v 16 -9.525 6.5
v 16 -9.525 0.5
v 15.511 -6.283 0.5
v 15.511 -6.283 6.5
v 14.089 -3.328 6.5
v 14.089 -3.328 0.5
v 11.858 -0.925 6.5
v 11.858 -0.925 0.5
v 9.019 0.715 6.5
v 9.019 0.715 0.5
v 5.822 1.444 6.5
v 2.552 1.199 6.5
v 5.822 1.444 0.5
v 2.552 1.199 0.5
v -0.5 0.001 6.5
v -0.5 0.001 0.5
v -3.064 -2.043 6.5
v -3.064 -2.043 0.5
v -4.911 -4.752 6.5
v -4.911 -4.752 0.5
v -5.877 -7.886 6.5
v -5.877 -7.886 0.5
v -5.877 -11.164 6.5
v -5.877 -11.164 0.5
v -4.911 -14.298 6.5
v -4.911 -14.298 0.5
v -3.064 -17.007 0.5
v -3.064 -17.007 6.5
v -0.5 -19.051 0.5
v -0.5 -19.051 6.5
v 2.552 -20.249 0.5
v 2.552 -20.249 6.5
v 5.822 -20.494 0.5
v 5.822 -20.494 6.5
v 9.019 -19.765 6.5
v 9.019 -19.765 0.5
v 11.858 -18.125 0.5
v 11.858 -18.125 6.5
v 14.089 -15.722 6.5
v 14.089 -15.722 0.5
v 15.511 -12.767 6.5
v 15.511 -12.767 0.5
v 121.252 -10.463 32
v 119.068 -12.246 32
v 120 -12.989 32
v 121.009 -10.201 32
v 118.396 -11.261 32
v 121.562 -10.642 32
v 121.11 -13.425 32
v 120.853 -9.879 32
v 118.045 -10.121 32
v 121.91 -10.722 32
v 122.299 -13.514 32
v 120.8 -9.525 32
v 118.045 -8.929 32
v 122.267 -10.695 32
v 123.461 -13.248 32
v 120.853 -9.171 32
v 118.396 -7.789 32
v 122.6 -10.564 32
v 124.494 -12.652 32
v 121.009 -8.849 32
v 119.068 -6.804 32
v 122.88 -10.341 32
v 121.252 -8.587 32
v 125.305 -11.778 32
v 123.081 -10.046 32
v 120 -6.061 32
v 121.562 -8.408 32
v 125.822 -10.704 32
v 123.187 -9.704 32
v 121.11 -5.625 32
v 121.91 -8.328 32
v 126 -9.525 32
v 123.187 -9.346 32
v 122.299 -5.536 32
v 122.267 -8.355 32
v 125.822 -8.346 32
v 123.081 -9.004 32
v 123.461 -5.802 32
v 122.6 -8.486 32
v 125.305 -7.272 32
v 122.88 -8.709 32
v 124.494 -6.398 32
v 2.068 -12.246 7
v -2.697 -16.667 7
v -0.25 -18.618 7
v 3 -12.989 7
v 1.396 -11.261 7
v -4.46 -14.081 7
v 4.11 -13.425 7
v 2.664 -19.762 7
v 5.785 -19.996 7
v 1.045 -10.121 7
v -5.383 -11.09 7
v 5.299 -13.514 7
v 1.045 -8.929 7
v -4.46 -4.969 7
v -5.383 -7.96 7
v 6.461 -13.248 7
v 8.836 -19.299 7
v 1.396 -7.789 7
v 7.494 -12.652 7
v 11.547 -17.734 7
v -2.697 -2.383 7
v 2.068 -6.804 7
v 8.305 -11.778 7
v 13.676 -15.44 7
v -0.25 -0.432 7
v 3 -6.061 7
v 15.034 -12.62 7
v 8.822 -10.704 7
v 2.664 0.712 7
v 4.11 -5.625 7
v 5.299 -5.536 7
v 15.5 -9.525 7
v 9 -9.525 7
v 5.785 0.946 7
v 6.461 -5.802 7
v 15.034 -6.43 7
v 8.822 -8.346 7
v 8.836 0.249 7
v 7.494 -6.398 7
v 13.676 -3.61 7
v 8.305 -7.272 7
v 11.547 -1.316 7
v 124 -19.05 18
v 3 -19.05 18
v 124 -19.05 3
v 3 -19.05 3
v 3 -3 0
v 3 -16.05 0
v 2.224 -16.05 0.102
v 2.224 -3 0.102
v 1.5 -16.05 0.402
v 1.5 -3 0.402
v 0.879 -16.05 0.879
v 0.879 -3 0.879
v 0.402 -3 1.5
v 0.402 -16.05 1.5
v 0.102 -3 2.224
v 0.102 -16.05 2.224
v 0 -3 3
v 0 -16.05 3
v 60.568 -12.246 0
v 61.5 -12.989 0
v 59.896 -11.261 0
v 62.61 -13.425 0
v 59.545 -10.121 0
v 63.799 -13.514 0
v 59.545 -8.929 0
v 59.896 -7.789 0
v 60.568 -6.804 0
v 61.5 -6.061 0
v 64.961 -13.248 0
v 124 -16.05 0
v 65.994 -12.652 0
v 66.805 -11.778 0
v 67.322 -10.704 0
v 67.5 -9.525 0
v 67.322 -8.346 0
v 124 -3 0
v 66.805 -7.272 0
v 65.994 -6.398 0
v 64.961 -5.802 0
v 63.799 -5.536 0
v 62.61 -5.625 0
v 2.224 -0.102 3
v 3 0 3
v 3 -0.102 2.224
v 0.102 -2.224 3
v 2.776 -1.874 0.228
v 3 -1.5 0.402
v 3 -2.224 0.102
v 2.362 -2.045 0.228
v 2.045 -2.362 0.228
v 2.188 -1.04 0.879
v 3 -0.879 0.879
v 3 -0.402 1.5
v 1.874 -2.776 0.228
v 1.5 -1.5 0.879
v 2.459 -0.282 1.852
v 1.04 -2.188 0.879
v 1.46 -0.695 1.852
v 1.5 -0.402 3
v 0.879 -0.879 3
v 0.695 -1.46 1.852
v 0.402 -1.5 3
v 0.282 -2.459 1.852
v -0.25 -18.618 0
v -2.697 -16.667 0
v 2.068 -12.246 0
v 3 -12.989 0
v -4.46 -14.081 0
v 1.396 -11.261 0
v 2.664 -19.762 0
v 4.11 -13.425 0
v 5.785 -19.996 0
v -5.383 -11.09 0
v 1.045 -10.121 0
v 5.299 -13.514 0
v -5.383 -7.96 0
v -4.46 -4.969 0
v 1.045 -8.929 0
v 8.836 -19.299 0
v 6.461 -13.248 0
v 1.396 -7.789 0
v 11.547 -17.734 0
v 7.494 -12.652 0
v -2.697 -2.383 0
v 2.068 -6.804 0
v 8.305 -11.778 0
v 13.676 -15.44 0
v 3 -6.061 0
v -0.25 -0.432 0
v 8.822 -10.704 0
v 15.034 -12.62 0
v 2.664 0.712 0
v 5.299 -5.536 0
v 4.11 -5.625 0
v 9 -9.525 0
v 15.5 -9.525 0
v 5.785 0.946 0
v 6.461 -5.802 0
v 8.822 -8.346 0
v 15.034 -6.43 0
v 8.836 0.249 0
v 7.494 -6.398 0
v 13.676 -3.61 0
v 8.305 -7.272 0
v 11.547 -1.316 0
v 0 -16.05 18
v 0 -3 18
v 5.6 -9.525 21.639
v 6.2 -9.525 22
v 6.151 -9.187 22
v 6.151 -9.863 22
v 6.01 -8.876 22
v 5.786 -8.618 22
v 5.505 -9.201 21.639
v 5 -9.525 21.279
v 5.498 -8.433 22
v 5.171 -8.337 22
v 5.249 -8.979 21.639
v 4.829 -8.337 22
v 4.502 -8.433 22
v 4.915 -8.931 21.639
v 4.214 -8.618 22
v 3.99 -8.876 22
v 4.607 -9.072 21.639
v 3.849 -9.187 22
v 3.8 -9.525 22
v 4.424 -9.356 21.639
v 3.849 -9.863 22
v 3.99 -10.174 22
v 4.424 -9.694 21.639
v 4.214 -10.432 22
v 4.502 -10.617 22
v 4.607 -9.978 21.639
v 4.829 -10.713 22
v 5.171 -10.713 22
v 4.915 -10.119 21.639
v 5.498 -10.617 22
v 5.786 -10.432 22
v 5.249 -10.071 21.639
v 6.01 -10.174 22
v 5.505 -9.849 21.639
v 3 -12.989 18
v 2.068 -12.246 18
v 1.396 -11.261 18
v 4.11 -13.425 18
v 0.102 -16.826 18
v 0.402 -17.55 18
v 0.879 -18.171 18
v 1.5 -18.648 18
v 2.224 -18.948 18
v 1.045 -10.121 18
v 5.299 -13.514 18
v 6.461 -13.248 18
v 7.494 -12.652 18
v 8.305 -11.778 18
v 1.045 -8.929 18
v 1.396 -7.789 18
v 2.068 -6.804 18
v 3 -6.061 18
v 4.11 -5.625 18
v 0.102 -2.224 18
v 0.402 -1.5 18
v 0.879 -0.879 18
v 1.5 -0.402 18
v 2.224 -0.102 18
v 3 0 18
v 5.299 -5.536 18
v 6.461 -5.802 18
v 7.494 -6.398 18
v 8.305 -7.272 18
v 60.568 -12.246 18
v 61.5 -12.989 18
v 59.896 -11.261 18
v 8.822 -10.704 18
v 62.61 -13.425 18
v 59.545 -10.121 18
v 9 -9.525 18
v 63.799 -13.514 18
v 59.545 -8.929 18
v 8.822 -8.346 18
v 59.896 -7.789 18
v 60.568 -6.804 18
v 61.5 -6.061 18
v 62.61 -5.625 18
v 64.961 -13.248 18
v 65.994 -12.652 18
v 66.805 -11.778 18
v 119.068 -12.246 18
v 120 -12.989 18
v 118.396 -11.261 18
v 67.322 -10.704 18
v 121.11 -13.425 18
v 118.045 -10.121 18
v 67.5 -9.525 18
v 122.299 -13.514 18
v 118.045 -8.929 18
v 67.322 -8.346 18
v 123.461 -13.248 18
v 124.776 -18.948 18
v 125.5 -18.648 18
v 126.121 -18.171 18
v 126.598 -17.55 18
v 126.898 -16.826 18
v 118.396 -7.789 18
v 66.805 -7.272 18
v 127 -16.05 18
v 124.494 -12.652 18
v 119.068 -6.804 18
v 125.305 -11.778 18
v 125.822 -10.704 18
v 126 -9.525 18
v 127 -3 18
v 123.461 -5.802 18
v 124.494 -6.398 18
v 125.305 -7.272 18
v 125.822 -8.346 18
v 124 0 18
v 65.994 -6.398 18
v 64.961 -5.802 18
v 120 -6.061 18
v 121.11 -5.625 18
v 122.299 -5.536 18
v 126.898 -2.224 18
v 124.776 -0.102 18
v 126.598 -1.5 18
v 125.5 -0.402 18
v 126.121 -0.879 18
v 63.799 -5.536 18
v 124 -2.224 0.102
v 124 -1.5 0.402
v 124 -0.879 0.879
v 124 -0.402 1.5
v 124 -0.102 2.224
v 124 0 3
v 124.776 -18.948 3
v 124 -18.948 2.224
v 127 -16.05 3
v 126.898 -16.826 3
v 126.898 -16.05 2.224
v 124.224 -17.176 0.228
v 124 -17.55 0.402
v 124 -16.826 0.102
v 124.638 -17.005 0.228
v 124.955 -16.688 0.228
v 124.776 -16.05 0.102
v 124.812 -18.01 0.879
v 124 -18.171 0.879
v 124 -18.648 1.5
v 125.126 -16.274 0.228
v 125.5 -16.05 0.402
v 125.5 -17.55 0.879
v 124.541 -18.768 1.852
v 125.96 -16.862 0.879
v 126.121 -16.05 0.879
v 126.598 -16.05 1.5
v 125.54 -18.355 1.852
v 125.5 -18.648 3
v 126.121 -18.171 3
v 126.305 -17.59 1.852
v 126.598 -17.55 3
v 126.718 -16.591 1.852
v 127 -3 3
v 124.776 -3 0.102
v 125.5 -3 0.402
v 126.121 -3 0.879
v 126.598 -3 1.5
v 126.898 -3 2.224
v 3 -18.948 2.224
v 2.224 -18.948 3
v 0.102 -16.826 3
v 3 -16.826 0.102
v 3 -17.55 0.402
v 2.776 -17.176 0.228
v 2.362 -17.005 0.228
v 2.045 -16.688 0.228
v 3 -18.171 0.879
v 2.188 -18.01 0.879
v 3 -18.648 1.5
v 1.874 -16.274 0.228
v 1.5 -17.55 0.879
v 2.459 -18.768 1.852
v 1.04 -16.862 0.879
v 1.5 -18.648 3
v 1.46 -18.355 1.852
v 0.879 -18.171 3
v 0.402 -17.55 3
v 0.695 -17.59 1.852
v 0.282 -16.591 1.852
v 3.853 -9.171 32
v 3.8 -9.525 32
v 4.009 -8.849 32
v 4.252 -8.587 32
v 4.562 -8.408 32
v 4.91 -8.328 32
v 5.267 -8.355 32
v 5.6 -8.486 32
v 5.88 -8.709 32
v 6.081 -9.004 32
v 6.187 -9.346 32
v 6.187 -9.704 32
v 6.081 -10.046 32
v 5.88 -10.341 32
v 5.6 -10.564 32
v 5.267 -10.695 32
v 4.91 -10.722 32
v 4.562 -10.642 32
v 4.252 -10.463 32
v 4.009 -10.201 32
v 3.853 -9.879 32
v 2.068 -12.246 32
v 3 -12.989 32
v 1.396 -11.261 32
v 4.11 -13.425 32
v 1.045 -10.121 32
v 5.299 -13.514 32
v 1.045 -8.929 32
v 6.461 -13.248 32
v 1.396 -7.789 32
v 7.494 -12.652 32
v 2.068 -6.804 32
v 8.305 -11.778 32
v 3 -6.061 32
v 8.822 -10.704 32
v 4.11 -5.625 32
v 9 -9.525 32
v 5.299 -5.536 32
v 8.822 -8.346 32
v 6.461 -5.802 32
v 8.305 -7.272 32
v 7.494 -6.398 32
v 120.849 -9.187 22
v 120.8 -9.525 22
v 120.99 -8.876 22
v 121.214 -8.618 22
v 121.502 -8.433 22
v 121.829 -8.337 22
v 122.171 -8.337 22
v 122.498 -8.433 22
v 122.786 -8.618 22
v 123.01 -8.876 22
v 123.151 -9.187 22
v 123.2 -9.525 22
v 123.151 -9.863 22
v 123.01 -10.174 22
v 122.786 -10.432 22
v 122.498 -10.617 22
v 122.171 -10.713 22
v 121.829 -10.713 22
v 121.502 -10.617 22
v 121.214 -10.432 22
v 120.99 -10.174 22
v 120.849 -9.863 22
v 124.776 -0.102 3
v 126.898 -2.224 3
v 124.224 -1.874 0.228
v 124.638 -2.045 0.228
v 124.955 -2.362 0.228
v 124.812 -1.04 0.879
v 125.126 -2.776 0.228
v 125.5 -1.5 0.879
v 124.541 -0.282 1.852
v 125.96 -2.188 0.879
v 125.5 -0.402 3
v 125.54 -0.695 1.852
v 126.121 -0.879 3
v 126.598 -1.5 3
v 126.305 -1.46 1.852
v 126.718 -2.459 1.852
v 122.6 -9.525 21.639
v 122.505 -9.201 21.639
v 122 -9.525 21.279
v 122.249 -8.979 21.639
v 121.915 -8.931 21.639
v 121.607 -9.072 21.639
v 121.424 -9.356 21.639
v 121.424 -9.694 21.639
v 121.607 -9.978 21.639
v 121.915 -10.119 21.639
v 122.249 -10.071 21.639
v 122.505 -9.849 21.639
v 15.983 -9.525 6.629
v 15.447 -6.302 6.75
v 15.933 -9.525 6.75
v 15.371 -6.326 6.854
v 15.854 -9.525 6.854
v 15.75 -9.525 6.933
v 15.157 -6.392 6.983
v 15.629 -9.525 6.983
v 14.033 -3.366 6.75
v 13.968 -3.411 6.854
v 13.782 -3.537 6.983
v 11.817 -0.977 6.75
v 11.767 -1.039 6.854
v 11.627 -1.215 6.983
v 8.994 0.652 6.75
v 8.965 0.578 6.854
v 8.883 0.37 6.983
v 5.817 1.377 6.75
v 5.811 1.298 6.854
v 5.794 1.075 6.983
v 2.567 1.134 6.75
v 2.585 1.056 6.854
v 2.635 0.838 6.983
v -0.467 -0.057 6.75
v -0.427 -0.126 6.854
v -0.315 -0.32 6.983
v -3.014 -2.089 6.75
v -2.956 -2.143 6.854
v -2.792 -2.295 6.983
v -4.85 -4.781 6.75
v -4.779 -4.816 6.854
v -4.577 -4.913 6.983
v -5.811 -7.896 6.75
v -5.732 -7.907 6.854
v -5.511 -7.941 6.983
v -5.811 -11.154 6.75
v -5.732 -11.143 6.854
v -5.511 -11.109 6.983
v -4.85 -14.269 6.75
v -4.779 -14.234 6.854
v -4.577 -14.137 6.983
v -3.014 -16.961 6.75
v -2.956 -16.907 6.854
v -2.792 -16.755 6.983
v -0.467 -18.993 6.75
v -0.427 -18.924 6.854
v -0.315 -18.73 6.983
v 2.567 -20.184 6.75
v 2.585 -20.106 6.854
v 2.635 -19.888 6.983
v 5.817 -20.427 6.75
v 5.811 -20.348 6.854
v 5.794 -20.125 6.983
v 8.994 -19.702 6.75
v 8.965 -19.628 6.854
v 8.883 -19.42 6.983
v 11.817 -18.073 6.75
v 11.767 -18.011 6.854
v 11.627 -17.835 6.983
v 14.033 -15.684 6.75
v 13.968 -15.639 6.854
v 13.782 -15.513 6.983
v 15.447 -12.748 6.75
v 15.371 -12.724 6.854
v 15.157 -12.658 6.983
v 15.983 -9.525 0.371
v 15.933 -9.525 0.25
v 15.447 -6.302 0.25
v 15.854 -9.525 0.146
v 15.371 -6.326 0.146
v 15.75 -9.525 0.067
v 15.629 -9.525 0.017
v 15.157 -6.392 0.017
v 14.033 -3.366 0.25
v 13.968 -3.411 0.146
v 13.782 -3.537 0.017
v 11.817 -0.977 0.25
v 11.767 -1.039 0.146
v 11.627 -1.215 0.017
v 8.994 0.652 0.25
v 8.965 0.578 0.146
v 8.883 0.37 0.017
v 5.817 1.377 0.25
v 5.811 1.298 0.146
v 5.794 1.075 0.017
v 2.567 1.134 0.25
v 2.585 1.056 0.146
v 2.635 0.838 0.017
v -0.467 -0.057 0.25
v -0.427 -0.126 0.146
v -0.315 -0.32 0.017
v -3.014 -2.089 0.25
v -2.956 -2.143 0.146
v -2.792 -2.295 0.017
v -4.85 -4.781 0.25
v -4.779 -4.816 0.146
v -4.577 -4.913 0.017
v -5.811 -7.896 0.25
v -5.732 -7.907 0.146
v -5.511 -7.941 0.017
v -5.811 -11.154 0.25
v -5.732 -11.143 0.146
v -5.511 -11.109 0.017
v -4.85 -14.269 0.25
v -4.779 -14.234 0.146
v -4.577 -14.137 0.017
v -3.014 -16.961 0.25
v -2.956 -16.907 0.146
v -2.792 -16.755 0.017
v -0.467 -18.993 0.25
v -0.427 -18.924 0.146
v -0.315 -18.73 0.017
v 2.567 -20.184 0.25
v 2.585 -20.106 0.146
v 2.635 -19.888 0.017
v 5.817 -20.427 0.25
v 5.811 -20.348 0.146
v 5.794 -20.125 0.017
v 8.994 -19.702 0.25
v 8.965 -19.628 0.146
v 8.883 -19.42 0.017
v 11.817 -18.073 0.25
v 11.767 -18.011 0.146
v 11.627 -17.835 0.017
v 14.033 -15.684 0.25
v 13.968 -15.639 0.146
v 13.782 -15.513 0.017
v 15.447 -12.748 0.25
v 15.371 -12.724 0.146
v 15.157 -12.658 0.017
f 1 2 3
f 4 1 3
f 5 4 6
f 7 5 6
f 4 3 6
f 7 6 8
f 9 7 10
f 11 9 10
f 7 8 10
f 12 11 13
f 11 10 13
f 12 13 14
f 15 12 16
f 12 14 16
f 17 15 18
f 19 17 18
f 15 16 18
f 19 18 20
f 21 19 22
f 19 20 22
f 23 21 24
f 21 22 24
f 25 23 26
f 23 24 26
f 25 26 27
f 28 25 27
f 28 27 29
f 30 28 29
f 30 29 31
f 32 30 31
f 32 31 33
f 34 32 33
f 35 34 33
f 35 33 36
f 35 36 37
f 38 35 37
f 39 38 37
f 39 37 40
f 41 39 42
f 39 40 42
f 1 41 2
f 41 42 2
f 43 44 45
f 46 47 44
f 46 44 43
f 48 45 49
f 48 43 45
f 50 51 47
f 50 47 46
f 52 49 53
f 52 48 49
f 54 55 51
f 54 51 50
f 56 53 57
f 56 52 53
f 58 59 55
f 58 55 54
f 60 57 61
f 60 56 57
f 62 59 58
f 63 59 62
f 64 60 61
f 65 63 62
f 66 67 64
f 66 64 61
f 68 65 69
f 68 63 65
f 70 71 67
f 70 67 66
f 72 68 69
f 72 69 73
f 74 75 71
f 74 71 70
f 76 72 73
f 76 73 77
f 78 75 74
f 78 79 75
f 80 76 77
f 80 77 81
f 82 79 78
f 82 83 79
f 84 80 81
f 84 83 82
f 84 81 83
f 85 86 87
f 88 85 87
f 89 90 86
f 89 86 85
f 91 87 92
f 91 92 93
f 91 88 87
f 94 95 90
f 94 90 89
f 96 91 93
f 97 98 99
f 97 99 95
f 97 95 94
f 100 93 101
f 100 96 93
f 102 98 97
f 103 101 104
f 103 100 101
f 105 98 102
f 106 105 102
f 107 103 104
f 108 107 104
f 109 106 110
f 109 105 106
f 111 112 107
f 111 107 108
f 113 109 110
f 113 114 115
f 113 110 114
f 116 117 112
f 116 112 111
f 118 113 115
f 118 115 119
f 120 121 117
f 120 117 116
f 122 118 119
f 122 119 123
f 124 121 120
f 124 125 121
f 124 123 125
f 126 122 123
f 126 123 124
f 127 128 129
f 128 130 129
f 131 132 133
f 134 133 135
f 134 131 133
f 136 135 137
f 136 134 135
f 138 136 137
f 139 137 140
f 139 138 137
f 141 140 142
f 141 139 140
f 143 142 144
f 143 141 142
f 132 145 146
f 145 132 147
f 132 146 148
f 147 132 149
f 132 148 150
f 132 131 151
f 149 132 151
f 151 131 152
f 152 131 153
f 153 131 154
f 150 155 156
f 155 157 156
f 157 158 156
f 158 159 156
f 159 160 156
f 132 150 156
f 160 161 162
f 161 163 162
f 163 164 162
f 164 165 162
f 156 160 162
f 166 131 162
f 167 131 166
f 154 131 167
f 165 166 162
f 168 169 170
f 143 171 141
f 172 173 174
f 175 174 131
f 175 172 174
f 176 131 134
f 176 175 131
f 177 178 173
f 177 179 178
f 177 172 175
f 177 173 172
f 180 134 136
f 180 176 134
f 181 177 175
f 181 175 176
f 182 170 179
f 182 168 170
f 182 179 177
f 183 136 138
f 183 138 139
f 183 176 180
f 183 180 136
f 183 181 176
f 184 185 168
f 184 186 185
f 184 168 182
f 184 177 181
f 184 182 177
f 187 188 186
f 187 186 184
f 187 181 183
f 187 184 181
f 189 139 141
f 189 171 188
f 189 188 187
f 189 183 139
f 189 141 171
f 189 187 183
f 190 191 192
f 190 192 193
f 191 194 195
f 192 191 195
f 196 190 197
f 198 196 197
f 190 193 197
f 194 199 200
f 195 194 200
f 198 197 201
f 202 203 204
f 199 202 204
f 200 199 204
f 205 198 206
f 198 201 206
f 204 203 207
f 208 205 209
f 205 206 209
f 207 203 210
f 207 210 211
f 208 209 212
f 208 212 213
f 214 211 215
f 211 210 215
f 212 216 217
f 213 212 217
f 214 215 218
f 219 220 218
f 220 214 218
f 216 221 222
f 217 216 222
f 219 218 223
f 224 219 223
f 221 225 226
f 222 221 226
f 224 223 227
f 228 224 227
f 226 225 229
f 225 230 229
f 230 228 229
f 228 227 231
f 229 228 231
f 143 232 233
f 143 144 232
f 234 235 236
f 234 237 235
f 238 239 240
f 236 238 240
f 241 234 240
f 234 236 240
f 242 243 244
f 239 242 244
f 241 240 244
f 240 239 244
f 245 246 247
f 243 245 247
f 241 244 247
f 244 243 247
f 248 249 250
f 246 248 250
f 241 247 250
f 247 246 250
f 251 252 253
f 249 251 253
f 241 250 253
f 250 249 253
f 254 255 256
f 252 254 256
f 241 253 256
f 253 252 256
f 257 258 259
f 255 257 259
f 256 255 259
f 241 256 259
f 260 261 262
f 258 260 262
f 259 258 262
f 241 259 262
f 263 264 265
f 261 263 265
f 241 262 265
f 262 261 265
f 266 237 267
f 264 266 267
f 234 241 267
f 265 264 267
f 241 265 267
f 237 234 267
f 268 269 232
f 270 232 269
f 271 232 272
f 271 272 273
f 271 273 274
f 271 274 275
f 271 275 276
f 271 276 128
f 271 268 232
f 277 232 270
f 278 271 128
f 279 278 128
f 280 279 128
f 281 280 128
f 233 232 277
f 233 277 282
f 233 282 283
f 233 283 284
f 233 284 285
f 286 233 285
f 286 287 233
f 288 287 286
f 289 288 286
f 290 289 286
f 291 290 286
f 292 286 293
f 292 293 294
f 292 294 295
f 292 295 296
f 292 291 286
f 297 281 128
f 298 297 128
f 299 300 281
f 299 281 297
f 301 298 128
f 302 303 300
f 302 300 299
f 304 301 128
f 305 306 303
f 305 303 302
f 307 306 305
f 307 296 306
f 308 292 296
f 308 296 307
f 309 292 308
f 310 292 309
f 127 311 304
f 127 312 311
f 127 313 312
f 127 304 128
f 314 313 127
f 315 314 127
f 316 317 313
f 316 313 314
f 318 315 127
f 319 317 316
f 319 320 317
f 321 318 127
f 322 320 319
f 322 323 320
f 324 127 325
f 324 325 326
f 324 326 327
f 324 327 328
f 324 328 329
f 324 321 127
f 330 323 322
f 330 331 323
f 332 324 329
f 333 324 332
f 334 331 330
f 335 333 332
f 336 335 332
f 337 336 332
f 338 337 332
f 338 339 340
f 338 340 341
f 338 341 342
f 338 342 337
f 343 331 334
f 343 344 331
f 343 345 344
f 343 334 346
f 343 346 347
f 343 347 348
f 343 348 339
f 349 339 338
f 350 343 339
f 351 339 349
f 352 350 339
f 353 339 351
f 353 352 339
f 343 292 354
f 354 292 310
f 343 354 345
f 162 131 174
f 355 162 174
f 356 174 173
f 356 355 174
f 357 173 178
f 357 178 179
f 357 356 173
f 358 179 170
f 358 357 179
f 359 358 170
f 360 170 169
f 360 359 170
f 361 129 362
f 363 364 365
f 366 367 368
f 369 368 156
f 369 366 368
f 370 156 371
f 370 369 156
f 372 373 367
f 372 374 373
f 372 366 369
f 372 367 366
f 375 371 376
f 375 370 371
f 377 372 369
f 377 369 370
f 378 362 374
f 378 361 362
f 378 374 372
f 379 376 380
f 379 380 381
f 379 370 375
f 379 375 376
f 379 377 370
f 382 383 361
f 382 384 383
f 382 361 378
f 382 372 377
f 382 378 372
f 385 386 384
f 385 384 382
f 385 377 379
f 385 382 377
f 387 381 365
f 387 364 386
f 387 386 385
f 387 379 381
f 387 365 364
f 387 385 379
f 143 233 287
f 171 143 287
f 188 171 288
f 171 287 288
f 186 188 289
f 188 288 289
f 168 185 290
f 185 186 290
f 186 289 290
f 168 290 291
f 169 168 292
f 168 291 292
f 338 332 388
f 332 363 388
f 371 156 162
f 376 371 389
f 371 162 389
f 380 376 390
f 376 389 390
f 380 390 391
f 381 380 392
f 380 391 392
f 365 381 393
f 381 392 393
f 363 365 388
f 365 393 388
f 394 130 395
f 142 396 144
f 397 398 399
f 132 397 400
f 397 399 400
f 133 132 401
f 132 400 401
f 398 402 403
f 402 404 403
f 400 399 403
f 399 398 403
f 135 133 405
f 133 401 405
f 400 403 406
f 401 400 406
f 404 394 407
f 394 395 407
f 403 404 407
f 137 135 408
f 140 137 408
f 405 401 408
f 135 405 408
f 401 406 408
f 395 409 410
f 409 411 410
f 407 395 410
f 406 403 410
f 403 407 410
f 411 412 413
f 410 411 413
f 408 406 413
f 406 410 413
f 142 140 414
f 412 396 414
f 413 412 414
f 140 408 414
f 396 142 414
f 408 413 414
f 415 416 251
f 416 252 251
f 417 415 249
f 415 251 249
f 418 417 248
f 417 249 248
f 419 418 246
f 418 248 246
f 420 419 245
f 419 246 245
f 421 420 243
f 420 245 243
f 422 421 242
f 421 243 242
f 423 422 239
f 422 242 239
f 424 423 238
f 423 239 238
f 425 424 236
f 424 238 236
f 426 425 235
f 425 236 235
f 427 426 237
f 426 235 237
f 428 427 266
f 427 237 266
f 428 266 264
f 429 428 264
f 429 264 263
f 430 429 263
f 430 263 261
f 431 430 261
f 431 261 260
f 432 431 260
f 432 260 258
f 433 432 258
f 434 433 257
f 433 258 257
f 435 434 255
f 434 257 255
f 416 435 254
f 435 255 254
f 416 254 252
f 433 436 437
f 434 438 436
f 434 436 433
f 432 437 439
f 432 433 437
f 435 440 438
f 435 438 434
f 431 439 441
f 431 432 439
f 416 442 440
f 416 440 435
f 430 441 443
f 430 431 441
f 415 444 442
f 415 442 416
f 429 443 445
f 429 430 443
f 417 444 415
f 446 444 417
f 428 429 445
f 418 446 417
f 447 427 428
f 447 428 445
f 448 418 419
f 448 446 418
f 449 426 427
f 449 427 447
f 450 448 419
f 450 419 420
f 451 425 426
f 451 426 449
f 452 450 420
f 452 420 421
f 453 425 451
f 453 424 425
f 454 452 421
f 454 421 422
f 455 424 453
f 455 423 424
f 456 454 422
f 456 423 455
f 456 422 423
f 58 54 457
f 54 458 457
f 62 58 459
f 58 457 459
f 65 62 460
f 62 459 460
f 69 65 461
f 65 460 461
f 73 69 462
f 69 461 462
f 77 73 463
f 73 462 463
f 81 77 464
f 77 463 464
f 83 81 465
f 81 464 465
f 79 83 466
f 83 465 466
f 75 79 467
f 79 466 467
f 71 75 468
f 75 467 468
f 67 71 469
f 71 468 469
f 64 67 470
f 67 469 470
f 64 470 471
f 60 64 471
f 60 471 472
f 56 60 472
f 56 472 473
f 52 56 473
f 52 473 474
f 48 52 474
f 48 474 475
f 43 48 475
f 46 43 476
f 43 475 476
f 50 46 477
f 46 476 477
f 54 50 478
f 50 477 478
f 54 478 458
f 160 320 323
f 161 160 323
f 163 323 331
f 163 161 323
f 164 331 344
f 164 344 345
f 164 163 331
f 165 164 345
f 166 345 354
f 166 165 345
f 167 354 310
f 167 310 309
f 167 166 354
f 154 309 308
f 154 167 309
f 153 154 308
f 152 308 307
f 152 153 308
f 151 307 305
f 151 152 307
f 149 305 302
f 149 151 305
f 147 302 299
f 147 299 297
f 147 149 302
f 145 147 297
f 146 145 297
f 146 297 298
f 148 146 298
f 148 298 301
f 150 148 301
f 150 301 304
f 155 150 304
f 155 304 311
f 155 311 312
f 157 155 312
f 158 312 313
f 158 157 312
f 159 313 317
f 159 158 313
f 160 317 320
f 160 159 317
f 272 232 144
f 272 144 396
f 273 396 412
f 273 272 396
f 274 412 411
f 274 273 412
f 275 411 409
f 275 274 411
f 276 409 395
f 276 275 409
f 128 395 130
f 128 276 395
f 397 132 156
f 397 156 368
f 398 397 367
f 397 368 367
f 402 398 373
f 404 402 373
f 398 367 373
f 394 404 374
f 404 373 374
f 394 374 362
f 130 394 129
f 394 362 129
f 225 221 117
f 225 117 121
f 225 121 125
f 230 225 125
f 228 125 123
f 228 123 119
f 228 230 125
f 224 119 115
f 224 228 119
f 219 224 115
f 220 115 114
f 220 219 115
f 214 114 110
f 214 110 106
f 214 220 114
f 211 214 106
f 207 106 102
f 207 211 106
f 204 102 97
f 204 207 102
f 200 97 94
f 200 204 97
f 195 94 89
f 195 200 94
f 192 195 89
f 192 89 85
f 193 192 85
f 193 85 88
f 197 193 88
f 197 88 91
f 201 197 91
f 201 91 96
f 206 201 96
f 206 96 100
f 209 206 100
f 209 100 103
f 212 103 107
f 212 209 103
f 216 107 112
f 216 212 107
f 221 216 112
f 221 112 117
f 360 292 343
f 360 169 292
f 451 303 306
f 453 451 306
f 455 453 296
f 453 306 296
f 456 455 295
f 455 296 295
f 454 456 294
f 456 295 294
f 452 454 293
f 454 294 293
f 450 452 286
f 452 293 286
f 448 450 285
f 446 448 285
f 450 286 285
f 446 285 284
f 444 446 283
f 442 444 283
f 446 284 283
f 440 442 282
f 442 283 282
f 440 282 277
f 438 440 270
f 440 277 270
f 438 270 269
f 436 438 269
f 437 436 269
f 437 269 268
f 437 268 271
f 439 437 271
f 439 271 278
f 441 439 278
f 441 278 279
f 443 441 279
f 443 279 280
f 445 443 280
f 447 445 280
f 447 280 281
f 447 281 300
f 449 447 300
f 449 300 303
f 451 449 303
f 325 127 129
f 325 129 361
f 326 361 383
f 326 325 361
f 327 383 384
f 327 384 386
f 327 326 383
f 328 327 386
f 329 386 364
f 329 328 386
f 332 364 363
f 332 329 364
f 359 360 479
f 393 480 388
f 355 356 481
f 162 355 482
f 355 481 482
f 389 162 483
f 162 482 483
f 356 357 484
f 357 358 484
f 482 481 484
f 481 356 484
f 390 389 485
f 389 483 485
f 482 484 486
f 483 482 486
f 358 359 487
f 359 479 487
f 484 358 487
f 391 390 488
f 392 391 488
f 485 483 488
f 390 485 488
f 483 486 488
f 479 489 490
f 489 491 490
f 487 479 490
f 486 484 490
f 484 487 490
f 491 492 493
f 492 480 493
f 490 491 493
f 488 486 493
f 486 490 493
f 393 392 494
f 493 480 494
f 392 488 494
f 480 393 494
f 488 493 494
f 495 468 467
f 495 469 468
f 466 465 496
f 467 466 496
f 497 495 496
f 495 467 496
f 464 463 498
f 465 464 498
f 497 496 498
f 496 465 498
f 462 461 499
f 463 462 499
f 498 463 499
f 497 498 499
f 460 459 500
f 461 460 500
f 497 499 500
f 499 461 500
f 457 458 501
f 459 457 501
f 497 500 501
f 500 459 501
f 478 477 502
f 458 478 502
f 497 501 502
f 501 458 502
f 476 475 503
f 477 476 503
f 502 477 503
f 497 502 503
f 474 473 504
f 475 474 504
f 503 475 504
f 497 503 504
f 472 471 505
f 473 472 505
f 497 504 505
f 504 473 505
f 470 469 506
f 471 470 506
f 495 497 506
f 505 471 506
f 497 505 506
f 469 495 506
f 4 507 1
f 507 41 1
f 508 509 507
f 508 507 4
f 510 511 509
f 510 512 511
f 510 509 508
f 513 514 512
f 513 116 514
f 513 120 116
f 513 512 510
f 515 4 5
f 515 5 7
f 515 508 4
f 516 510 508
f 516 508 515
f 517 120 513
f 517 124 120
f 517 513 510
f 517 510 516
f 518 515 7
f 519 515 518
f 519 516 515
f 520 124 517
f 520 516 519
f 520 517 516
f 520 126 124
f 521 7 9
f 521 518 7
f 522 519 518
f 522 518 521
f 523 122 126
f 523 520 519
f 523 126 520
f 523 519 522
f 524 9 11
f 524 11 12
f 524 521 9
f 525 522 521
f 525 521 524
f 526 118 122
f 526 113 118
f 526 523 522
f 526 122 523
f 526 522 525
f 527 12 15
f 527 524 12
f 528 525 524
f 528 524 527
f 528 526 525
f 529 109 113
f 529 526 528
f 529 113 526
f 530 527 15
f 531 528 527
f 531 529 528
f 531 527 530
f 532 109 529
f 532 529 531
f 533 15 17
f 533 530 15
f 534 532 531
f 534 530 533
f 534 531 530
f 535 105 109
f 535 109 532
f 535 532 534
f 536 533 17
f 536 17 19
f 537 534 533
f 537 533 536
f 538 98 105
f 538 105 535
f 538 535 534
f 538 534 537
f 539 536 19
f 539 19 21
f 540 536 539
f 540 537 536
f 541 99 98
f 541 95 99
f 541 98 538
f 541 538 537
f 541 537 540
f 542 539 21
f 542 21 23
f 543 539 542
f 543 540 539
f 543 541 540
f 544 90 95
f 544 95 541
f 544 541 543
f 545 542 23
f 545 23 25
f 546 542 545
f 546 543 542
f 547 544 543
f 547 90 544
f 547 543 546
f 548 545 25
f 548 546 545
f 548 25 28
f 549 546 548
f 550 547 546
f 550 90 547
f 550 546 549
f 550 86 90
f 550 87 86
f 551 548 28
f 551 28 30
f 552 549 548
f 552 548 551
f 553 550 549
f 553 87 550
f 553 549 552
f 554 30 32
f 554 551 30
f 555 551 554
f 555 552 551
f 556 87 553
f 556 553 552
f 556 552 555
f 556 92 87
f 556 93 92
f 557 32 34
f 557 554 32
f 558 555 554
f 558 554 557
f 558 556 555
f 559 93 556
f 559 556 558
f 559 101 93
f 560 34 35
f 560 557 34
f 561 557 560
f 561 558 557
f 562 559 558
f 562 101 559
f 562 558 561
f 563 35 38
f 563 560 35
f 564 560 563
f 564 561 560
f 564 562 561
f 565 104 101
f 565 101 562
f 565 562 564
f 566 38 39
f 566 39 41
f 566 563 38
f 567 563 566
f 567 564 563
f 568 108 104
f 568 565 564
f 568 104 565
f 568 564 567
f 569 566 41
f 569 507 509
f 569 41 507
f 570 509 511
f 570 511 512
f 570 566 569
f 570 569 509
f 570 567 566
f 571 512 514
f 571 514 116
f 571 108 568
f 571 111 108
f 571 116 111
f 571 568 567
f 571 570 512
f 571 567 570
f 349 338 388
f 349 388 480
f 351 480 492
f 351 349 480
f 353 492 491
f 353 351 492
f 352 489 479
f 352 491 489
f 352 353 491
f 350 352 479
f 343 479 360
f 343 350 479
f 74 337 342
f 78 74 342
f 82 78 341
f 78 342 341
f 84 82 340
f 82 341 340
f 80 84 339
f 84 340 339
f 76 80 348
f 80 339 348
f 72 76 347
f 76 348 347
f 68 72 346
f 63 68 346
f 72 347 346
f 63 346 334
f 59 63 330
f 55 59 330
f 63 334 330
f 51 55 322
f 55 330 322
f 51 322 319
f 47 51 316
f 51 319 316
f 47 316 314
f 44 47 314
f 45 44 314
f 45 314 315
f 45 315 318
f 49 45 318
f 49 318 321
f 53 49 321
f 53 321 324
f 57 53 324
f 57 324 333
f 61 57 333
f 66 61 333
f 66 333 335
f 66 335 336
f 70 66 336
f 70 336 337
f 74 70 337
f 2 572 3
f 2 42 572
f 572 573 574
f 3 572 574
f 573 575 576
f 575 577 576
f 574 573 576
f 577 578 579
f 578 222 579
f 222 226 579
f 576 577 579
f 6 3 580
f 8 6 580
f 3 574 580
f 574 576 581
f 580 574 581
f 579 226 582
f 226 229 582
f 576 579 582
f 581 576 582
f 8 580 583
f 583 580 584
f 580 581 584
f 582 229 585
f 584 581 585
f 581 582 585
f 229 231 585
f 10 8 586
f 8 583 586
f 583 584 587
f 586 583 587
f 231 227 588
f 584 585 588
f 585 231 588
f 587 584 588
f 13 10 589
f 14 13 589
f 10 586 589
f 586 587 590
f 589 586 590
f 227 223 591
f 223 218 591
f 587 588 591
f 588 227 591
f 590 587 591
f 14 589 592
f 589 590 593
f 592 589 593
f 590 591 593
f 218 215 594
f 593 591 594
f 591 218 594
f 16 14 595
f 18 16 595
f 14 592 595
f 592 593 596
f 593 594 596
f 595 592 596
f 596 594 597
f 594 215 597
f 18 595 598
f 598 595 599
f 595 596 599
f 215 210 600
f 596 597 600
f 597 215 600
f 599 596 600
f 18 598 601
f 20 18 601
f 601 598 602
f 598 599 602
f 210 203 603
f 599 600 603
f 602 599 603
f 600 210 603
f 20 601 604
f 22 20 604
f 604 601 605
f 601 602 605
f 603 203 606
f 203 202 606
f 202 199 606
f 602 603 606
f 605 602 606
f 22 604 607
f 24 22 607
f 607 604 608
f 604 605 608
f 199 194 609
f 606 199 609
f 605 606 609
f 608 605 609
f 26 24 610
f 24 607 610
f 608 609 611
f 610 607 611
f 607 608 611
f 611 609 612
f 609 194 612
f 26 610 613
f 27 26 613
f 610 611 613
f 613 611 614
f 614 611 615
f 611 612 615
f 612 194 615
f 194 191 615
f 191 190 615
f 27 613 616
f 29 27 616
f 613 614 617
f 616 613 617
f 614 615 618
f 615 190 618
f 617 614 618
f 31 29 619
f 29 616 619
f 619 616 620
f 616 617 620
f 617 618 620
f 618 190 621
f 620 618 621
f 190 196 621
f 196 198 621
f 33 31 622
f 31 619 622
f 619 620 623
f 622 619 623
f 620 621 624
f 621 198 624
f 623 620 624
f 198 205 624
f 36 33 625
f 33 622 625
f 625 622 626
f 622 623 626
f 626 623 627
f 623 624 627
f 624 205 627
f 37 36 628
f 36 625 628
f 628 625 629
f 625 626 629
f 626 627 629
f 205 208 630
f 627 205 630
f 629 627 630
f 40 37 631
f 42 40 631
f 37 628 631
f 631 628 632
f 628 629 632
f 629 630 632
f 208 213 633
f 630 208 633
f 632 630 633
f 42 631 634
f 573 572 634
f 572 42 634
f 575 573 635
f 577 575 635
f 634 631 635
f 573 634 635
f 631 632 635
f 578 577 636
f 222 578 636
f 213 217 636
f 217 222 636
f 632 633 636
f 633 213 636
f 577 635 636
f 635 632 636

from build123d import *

# Parameters (mm, degrees)
F0_W     = 127
F0_H     = 19.05
F0_R     = 4
F1_DEPTH = 18
F2_DEPTH = 32
F4_D     = 2.4
F4_DEPTH = 10
F4_TIP   = 0.7210327428
F5_R     = 3
F6_R     = 11
F6_R_2   = 4
F7_DEPTH = 7
F8_R     = 0.5


with BuildPart() as f1:
    # F0 (on Top) → F1 (new body)
    with BuildSketch(Plane.XY):
        with Locations((63.5, -9.525)):
            Rectangle(F0_W, F0_H)
        with Locations((5, -9.525)):
            Circle(F0_R, mode=Mode.SUBTRACT)
        with Locations((63.5, -9.525)):
            Circle(F0_R, mode=Mode.SUBTRACT)
        with Locations((122, -9.525)):
            Circle(F0_R, mode=Mode.SUBTRACT)
        with Locations((5, -9.525)):
            Circle(F0_R)
        with Locations((122, -9.525)):
            Circle(F0_R)
    extrude(amount=F1_DEPTH)

    # F0 (on Top) → F2 (join)
    with BuildSketch(Plane.XY):
        with Locations((5, -9.525)):
            Circle(F0_R)
        with Locations((122, -9.525)):
            Circle(F0_R)
    extrude(amount=F2_DEPTH)

    # F4
    with Locations(Plane.XY.offset(32)):
        with Locations((5, -9.525), (122, -9.525)):
            Hole(F4_D / 2, depth=F4_DEPTH)
            with Locations((0, 0, -(F4_DEPTH + F4_TIP / 2))):  # 118° drill point
                Cone(0, F4_D / 2, F4_TIP, mode=Mode.SUBTRACT)

    # F5
    f5_edges = [f1.edges().sort_by_distance(p)[0] for p in [
        (127, -19.05, 9),
        (127, 0, 9),
        (0, 0, 9),
        (0, -19.05, 9),
        (63.5, -19.05, 0),
        (63.5, 0, 0),
        (0, -9.525, 0),
        (127, -9.525, 0),
    ]]
    fillet(f5_edges, radius=F5_R)


with BuildPart() as f7:
    # F6 (on Top) → F7 (new body)
    with BuildSketch(Plane.XY):
        with Locations((5, -9.525)):
            Circle(F6_R)
        with Locations((5, -9.525)):
            Circle(F6_R_2, mode=Mode.SUBTRACT)
    extrude(amount=F7_DEPTH)

    # F8
    f8_edges = [f7.edges().sort_by_distance(p)[0] for p in [
        (-6, -9.525, 7),
        (-6, -9.525, 0),
    ]]
    fillet(f8_edges, radius=F8_R)


solid = Compound([f1.part, f7.part])
